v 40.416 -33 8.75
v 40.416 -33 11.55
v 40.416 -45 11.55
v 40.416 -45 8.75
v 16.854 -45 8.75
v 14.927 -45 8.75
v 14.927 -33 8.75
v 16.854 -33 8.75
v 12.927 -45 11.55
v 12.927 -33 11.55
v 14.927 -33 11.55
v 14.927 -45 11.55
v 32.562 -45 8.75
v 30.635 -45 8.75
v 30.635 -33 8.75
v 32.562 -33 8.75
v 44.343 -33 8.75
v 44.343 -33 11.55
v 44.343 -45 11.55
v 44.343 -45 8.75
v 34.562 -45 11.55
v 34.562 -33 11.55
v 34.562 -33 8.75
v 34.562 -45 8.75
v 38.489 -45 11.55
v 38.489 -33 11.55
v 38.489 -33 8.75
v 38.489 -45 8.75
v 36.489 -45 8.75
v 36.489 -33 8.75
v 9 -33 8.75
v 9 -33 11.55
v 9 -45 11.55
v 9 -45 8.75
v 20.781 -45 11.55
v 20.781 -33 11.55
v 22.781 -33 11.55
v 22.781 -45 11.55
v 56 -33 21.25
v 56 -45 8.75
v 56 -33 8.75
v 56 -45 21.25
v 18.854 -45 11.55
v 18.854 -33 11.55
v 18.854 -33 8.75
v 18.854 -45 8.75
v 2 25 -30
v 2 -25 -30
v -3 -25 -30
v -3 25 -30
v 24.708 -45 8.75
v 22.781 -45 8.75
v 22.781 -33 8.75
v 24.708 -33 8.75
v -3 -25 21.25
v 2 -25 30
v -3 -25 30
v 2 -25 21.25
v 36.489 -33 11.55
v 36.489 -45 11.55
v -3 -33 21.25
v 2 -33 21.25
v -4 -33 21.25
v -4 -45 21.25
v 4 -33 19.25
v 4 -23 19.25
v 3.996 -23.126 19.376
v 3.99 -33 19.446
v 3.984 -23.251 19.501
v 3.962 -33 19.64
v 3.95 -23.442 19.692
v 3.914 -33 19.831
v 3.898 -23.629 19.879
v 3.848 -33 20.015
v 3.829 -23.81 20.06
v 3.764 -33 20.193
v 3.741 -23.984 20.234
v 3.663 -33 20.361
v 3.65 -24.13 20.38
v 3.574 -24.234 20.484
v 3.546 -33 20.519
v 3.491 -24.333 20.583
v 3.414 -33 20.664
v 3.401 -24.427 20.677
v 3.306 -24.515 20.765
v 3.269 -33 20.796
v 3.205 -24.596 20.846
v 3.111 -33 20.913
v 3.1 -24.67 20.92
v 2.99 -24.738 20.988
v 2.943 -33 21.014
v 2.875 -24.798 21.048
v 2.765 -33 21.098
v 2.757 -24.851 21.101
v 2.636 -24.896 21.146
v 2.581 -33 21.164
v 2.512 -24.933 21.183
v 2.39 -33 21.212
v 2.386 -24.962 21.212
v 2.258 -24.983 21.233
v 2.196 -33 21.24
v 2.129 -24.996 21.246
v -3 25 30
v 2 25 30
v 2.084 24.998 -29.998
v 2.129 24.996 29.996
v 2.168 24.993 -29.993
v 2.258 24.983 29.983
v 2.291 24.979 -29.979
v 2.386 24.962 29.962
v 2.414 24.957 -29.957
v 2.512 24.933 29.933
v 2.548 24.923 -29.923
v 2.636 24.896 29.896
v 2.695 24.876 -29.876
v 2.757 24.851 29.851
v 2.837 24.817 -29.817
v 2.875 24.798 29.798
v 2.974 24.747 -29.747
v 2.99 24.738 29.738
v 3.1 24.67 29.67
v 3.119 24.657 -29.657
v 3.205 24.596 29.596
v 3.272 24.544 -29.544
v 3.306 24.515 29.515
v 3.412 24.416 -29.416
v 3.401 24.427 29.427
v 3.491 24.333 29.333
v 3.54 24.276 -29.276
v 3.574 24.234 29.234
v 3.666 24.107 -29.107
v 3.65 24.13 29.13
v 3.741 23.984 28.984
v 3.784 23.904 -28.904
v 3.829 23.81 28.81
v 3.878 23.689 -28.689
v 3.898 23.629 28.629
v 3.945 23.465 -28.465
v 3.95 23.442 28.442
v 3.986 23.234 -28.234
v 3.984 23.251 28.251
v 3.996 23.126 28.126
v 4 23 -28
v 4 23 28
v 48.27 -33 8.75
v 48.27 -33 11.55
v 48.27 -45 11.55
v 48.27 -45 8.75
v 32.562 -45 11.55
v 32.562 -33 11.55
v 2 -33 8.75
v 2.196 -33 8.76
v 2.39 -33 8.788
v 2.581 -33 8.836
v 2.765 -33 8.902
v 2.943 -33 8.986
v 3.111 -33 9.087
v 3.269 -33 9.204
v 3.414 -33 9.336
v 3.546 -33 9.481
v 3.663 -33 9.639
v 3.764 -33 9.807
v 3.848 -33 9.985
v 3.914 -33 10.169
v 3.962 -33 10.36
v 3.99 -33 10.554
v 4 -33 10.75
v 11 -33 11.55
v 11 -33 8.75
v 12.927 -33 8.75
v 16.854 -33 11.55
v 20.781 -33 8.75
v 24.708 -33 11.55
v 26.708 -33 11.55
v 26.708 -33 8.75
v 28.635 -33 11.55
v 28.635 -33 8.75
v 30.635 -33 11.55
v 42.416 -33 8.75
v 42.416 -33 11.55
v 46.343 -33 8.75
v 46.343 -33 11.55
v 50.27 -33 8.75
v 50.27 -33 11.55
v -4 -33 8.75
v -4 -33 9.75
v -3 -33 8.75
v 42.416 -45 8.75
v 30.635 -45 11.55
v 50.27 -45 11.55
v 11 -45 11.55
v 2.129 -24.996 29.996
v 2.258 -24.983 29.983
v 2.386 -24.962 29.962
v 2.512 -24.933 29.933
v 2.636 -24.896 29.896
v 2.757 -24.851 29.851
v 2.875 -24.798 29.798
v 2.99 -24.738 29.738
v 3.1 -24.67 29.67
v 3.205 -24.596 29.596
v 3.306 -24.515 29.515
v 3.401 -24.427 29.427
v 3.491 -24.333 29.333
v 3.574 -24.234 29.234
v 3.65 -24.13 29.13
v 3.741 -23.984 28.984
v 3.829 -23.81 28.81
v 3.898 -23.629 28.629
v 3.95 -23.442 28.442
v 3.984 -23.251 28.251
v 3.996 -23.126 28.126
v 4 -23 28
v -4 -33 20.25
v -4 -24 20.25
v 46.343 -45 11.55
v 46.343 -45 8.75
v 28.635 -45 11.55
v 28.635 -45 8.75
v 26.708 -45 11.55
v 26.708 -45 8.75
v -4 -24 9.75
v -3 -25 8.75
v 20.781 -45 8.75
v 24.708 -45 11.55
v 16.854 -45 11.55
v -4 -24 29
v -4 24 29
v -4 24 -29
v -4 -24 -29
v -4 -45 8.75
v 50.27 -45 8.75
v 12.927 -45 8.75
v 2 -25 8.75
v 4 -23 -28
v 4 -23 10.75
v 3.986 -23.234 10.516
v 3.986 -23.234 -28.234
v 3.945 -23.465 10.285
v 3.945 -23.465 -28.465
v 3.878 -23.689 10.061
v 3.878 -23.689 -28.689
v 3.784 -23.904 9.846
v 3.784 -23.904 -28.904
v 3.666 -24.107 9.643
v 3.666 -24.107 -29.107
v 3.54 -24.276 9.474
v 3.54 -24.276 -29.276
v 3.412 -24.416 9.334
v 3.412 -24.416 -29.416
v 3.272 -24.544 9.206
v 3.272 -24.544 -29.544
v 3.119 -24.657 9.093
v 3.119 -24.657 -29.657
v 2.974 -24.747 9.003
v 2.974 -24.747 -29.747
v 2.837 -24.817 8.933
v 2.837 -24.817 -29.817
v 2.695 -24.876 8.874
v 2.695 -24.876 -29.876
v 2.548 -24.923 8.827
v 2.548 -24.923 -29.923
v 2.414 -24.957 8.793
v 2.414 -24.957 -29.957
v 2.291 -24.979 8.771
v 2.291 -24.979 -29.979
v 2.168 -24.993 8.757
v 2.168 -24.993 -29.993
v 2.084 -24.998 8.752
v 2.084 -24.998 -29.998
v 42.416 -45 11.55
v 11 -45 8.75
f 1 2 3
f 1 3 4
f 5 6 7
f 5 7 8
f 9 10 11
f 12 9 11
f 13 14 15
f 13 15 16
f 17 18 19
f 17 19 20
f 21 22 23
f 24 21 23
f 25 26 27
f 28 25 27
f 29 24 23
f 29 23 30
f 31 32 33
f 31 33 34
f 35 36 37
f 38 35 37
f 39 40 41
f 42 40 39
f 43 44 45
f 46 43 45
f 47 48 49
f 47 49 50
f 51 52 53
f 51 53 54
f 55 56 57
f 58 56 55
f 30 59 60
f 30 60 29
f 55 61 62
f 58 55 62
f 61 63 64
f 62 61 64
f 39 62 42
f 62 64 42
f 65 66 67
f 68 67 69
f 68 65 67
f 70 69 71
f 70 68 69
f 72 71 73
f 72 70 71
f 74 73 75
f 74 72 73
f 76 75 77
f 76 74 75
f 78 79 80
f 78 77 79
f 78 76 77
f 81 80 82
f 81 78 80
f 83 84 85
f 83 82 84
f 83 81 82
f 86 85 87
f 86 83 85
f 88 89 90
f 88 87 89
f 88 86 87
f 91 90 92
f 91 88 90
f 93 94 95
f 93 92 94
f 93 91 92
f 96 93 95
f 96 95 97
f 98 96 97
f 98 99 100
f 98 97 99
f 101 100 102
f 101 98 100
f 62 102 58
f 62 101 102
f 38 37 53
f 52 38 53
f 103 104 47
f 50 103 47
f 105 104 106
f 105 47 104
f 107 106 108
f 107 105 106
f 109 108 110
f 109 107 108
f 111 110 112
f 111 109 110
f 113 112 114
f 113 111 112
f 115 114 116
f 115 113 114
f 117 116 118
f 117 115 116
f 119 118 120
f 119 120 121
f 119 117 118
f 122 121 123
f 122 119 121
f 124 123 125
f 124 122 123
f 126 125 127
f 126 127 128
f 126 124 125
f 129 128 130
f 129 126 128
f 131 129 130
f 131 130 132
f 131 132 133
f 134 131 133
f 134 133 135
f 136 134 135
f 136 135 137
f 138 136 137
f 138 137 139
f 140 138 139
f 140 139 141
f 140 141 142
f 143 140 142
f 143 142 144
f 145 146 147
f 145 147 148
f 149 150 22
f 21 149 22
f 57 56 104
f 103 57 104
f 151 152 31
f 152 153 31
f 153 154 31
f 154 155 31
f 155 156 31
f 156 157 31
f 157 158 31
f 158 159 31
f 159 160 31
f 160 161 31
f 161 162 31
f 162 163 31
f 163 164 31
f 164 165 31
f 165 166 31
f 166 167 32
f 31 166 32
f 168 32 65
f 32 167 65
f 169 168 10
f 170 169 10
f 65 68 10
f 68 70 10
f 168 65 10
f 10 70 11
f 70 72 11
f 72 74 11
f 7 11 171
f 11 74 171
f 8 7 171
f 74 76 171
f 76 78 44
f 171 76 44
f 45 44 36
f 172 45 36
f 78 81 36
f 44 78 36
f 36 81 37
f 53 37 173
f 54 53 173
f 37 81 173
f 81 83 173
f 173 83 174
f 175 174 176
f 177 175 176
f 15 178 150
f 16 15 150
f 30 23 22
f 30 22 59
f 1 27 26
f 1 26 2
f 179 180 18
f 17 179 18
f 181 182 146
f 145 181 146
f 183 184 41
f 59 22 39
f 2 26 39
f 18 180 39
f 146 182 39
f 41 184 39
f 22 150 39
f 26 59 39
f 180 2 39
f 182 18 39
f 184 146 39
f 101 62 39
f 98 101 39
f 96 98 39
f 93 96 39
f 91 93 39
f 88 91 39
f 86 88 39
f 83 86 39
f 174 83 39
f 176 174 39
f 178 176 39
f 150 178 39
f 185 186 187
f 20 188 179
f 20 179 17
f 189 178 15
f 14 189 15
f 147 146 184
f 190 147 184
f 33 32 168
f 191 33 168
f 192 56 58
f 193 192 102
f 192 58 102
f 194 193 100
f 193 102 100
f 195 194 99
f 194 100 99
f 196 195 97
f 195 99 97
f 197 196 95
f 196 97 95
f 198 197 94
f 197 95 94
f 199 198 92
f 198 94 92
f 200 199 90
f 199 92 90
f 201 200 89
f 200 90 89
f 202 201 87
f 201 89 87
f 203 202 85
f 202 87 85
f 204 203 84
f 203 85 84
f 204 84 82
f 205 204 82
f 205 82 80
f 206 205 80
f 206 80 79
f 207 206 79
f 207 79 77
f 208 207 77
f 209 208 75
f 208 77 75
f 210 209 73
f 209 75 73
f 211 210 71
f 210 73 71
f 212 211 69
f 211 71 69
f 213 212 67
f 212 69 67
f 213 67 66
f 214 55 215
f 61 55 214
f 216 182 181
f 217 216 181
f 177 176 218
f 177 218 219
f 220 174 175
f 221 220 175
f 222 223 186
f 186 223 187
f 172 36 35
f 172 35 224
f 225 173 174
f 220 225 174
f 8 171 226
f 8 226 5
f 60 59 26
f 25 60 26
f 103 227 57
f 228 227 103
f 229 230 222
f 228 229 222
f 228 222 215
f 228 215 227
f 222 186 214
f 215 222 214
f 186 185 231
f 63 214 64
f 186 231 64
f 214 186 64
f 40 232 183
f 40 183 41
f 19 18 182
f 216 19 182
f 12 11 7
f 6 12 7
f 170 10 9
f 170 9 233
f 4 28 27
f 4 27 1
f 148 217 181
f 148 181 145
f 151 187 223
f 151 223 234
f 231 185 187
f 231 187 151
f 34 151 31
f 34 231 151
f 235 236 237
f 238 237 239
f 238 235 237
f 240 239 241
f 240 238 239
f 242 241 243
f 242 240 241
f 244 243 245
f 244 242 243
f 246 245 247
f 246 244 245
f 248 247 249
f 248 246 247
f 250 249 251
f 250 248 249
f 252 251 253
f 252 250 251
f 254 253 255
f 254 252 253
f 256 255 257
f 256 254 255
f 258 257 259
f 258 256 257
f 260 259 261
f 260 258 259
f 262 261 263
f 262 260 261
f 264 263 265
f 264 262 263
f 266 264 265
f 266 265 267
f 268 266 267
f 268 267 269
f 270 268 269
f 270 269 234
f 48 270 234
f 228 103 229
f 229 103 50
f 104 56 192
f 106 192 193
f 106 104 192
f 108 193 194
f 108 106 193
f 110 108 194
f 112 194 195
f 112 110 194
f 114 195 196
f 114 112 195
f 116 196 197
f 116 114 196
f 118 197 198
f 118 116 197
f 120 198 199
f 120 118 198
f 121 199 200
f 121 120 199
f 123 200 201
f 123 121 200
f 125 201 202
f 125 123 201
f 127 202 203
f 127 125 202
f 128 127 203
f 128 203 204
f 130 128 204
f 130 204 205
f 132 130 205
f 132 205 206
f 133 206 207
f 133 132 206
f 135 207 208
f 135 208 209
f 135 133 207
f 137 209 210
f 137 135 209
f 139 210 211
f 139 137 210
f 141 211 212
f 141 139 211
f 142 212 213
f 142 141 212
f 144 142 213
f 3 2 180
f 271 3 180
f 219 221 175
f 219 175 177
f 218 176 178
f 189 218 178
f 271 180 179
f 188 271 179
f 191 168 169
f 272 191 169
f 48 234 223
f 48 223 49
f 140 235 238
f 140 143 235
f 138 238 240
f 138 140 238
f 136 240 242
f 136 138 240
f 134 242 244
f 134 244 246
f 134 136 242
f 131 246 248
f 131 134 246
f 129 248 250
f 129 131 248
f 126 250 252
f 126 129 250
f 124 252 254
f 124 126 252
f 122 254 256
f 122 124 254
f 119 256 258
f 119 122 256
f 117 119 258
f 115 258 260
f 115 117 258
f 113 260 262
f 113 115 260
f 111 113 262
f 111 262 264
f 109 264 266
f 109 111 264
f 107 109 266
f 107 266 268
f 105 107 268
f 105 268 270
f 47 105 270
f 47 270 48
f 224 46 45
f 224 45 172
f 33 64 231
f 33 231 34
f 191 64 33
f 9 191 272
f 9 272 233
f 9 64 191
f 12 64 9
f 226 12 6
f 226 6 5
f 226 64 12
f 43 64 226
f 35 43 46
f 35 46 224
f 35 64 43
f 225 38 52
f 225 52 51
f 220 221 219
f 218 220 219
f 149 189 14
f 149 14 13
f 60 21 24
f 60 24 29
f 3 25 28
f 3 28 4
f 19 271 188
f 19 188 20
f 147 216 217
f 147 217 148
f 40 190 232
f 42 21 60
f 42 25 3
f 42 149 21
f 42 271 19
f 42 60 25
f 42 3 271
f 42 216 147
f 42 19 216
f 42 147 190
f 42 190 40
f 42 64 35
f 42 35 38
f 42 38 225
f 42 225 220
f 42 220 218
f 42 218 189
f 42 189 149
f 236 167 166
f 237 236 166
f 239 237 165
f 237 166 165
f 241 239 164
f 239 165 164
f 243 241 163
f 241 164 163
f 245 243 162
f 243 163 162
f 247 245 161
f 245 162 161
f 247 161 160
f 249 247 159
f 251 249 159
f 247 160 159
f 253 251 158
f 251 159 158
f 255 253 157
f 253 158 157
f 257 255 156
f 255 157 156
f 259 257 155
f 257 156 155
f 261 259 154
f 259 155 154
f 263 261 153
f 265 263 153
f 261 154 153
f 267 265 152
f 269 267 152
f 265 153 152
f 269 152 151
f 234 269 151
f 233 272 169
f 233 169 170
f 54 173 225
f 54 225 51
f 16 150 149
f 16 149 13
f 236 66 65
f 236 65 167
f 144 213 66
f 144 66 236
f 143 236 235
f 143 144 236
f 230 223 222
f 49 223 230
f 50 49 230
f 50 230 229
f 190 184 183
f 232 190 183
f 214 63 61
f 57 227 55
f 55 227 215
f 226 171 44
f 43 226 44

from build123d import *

# Parameters (mm, degrees)
SKETCH2_W           = 60
SKETCH2_H           = 50
BOSS_EXTRUDE1_DEPTH = 4
SKETCH3_W           = 8
SKETCH3_H           = 12.5
BOSS_EXTRUDE2_DEPTH = 20
FILLET2_R           = 2
CHAMFER2_SIZE       = 1
SKETCH4_W           = 60
SKETCH4_H           = 12.5
BOSS_EXTRUDE4_DEPTH = 12
SKETCH10_W          = 2
SKETCH10_H          = 2.8
CUT_EXTRUDE1_DEPTH  = 87.02325267
LPATTERN5_COUNT     = 11
LPATTERN5_PITCH     = 3.927


with BuildPart() as part:
    # Sketch2 → Boss-Extrude1 (new, symmetric)
    with BuildSketch(Plane(origin=(0, 0, 0), x_dir=(0, 0, -1), z_dir=(1, 0, 0))):
        Rectangle(SKETCH2_W, SKETCH2_H)
    extrude(amount=BOSS_EXTRUDE1_DEPTH, both=True)

    # Sketch3 → Boss-Extrude2 (add)
    with BuildSketch(Plane.XZ.offset(25)):
        with Locations((0, 15)):
            Rectangle(SKETCH3_W, SKETCH3_H)
    extrude(amount=BOSS_EXTRUDE2_DEPTH)

    # Fillet2
    fillet2_edges = [part.edges().sort_by_distance(p)[0] for p in [
        (4, 0, 30),
        (4, -25, -10.625),
        (4, -25, 25.625),
        (4, -35, 8.75),
        (4, -35, 21.25),
        (4, -45, 15),
        (4, 0, -30),
        (4, 25, 0),
    ]]
    fillet(fillet2_edges, radius=FILLET2_R)

    # Chamfer2
    chamfer2_edges = [part.edges().sort_by_distance(p)[0] for p in [
        (-4, -25, -10.625),
        (-4, -35, 21.25),
        (-4, -35, 8.75),
        (-4, -45, 15),
        (-4, -25, 25.625),
        (-4, 0, 30),
        (-4, 25, 0),
        (-4, 0, -30),
    ]]
    chamfer(chamfer2_edges, length=CHAMFER2_SIZE)

    # Sketch4 → Boss-Extrude4 (add)
    with BuildSketch(Plane.XZ.offset(45)):
        with Locations((26, 15)):
            Rectangle(SKETCH4_W, SKETCH4_H)
    extrude(amount=-BOSS_EXTRUDE4_DEPTH)

    # Sketch10 → Cut-Extrude1 (cut, symmetric)
    with BuildSketch(Plane(origin=(0, -33, 0), x_dir=(1, 0, 0), z_dir=(0, 1, 0))):
        with Locations((10, -10.15)):
            Rectangle(SKETCH10_W, SKETCH10_H)
    cut_extrude1 = extrude(amount=CUT_EXTRUDE1_DEPTH, both=True, mode=Mode.SUBTRACT)

    # LPattern5: Cut-Extrude1 ×11
    with Locations(*[(i * LPATTERN5_PITCH, 0, 0) for i in range(1, LPATTERN5_COUNT)]):
        add(cut_extrude1, mode=Mode.SUBTRACT)


solid = part.part
